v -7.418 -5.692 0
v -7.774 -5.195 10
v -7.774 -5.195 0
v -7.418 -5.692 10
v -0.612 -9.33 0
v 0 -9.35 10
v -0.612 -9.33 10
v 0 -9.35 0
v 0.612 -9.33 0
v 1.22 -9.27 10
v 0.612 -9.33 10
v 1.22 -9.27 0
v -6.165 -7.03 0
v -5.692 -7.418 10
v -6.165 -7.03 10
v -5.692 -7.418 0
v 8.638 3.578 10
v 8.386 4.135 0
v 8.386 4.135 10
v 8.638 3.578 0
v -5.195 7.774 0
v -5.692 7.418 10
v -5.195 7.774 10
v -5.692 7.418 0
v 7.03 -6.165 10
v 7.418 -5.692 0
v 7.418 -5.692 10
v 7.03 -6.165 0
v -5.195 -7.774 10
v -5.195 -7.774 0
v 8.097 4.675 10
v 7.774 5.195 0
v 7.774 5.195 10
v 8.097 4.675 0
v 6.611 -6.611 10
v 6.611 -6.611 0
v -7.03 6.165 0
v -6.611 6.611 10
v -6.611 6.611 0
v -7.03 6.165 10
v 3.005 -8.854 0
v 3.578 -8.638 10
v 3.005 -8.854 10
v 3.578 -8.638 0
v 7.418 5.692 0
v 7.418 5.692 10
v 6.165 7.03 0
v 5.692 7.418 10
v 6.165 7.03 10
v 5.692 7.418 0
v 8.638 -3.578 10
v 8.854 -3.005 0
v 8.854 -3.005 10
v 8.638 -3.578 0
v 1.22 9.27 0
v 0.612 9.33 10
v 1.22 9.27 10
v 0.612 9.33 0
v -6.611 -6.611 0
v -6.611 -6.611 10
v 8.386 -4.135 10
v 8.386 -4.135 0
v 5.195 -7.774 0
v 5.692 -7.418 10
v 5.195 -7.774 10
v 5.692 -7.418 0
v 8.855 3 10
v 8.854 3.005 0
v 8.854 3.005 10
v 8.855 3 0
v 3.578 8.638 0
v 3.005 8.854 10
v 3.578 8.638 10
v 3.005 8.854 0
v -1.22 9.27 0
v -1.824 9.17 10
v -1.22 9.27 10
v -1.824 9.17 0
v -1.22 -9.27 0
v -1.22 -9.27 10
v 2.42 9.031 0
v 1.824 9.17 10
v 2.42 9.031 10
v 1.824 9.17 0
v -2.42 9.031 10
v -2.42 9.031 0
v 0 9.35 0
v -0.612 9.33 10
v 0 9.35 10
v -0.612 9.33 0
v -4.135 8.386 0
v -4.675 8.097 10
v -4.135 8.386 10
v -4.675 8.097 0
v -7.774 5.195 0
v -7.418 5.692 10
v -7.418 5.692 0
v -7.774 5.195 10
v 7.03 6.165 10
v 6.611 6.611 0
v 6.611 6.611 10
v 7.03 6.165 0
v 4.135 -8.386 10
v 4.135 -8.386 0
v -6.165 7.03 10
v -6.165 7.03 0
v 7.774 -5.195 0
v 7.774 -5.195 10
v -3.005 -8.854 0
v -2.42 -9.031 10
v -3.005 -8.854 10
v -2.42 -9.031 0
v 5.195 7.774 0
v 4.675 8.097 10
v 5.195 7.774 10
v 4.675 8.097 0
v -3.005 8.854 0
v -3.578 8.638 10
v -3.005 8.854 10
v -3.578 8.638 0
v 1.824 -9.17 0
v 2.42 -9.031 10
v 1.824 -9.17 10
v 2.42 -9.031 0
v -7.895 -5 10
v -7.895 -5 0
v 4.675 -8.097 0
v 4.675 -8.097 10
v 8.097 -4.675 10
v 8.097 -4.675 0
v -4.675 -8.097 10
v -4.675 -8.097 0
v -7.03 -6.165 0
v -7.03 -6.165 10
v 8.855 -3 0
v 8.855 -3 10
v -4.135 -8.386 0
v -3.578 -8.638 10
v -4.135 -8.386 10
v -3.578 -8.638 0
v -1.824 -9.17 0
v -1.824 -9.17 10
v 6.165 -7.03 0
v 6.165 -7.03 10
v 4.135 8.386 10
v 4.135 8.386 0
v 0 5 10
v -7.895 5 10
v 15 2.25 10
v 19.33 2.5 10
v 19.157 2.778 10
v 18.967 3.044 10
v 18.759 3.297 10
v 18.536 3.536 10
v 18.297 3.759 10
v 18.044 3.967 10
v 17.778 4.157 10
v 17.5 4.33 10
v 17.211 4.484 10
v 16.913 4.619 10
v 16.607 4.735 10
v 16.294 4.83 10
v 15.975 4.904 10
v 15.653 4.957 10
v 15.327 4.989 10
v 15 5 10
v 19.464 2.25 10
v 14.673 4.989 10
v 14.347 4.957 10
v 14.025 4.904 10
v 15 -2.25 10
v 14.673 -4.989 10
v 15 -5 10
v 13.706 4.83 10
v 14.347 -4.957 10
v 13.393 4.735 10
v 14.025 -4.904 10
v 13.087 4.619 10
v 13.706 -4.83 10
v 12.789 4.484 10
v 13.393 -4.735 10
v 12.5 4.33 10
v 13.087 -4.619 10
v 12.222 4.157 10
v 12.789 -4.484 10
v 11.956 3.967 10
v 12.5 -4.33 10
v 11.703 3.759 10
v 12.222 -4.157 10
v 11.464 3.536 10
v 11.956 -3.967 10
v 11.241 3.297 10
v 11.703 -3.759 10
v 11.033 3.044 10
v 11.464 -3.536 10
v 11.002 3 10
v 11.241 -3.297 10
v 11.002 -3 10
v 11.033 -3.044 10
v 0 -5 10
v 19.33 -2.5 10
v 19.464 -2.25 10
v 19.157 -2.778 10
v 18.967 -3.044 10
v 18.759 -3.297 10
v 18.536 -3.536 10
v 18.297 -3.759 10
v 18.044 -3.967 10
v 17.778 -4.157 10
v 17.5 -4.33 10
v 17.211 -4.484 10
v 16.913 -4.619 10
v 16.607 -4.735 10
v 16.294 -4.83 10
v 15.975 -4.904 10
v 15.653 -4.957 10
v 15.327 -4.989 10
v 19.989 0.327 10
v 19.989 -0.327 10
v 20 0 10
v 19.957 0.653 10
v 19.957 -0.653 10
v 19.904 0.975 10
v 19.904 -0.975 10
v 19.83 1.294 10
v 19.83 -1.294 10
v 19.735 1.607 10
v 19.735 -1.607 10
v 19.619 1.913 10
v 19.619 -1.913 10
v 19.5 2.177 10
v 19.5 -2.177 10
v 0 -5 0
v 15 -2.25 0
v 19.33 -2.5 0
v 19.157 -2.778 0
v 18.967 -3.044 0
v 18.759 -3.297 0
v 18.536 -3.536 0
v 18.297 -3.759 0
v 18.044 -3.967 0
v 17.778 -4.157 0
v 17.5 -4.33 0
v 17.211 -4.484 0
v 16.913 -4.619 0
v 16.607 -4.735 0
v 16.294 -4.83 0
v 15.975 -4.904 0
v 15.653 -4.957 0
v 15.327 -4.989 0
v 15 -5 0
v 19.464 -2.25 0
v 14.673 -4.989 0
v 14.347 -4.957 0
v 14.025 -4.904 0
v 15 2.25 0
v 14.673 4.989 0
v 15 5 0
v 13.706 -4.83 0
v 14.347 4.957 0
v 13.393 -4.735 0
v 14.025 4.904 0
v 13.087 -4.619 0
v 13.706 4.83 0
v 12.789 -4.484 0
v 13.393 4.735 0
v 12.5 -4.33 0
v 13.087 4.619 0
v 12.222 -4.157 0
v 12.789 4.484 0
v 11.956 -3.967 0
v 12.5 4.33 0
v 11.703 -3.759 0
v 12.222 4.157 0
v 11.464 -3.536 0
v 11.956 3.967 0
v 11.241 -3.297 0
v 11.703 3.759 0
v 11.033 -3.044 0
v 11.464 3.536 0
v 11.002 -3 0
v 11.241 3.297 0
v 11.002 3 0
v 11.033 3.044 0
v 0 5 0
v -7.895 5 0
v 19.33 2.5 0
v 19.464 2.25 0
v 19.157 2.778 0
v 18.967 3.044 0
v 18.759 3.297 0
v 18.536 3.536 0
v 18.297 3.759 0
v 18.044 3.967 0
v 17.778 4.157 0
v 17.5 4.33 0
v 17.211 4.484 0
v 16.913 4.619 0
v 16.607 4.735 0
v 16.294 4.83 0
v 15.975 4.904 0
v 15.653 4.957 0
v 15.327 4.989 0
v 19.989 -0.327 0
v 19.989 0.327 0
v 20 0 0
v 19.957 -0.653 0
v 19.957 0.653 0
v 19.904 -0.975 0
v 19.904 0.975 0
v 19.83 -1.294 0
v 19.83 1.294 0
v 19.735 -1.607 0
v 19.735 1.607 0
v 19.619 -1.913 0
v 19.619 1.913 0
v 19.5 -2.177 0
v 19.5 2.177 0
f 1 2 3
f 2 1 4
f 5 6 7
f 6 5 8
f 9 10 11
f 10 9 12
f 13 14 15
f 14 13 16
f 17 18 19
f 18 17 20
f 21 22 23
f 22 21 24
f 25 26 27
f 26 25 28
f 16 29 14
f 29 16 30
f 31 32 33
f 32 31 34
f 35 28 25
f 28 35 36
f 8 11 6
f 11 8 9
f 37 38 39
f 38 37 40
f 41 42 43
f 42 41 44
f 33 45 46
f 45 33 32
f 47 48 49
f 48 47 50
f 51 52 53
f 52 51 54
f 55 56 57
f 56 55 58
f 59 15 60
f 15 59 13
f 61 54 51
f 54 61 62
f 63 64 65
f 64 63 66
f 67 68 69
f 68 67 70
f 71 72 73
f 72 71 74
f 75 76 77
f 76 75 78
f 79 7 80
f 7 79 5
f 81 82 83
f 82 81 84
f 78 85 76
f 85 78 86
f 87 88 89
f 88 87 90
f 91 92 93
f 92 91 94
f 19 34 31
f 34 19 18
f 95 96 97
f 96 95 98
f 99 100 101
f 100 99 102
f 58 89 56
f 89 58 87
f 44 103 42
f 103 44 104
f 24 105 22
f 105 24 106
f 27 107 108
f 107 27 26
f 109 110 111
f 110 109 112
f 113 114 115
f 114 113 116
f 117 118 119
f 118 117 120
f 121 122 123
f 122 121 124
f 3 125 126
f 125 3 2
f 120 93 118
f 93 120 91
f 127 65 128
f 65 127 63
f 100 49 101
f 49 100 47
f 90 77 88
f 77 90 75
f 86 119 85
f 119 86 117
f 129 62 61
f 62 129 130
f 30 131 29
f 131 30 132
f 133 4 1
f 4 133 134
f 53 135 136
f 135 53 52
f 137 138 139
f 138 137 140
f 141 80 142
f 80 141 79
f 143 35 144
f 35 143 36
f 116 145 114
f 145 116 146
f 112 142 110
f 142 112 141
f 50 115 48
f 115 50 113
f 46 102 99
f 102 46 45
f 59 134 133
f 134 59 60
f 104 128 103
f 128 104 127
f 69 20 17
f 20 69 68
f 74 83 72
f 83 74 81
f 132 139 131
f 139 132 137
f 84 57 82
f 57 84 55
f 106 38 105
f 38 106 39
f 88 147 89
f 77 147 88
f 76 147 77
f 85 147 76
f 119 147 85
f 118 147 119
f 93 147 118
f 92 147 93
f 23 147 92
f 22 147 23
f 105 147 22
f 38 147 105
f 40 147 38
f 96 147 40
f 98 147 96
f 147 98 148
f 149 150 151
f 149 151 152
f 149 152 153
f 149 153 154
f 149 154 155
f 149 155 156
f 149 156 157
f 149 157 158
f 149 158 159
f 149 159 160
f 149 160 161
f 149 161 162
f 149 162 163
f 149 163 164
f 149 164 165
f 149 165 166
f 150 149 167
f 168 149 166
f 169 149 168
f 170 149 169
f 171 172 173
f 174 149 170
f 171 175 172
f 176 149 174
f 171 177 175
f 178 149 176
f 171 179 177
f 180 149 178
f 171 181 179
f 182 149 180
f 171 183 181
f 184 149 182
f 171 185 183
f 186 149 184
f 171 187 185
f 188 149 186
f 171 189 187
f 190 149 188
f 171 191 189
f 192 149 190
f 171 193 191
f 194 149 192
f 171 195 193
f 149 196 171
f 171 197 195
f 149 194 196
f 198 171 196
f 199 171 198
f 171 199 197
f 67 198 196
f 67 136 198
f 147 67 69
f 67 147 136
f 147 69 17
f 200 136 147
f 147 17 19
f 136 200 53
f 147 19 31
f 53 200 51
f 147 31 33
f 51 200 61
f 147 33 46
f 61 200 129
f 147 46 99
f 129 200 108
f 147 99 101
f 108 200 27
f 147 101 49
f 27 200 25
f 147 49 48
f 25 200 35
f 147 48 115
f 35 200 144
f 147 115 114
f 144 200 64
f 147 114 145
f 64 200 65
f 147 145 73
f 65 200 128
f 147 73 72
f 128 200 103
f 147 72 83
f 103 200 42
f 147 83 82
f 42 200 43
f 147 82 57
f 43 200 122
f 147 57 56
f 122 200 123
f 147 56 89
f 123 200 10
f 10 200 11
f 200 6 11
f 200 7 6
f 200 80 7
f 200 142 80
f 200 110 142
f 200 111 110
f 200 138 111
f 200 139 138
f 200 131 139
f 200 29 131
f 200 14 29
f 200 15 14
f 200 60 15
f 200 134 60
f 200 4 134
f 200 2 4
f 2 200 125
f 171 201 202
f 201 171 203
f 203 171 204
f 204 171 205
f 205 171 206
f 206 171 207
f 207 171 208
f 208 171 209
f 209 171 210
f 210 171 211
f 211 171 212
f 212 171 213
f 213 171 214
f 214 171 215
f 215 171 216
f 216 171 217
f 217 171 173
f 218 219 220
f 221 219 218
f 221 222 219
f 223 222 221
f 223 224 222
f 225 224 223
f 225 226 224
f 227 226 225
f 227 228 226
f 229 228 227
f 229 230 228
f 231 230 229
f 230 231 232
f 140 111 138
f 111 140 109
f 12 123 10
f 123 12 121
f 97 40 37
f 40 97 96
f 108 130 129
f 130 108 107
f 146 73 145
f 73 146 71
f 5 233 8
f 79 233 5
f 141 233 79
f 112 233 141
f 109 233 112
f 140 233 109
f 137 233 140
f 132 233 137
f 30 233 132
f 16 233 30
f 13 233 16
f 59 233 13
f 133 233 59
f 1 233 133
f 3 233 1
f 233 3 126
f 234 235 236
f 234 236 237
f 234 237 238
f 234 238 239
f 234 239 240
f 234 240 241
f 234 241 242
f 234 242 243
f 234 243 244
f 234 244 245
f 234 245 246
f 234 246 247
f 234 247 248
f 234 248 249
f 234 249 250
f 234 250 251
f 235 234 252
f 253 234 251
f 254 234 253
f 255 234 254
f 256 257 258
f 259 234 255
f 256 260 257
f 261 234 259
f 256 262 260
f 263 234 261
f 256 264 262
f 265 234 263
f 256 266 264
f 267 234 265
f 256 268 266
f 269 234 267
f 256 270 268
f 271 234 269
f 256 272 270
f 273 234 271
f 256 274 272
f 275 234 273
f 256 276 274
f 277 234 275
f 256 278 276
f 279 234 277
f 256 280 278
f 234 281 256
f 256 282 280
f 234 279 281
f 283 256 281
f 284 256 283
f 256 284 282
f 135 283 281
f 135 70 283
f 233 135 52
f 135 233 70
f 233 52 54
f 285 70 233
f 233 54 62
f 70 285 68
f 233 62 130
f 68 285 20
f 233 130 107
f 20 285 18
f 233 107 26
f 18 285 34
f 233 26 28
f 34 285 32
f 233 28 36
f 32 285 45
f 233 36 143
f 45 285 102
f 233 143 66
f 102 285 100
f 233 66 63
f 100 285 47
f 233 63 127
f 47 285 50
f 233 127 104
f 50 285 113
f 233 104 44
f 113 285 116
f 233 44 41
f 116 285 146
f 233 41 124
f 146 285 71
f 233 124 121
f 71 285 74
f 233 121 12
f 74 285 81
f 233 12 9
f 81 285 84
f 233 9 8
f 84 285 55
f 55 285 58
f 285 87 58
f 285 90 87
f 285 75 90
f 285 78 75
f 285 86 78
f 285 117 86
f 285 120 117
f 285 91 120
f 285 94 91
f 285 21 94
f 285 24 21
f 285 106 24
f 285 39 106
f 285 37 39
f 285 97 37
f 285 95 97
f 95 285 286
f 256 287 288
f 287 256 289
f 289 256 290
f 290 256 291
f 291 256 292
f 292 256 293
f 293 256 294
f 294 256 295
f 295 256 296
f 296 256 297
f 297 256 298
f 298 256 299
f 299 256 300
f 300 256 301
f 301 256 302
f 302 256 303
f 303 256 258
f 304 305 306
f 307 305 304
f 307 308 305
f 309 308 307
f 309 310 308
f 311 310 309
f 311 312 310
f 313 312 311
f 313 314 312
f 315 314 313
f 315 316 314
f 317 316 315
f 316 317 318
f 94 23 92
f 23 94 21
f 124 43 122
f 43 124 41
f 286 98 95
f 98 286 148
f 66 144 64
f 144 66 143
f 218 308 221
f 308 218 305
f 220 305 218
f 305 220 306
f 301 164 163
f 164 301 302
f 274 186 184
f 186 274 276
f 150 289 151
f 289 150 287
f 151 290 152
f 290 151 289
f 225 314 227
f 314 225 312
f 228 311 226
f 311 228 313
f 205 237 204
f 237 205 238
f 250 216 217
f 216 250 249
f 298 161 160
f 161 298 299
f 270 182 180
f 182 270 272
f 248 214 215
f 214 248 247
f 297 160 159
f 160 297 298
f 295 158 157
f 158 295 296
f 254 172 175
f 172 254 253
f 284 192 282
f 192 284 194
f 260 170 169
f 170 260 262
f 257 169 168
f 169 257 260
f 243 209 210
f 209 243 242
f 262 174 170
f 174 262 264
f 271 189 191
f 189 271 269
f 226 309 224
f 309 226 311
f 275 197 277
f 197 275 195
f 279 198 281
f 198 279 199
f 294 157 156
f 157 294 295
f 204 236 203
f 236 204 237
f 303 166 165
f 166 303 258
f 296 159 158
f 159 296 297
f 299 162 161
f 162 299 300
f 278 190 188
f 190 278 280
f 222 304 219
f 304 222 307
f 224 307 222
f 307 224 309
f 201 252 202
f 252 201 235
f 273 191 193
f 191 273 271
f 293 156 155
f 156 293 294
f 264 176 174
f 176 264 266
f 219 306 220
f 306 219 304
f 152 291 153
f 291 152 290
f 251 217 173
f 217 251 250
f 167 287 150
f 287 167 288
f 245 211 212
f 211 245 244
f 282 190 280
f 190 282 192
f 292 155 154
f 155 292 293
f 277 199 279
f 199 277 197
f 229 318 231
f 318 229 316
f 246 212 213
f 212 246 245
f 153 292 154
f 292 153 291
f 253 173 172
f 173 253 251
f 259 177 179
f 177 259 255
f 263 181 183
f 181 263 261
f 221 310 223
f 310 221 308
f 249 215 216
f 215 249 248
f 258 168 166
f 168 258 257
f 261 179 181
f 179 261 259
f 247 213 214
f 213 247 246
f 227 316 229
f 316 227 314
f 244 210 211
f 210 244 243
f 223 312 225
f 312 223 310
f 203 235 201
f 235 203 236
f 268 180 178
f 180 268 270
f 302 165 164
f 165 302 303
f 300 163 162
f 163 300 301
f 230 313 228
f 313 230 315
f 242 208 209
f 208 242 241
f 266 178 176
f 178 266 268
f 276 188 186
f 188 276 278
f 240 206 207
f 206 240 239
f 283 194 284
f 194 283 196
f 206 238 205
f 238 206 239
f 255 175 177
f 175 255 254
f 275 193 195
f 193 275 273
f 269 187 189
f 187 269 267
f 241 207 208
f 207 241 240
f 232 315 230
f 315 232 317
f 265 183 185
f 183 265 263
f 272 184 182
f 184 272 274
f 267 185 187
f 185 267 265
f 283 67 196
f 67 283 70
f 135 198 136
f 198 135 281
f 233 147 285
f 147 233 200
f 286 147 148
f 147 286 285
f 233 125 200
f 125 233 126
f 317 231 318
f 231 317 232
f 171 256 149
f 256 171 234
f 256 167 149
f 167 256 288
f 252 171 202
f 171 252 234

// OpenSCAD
// Snap-on tubing clip for 12.7 mm lab stand rod
// Print orientation: flat on bed, extrusion along +Z

$fn = 96;

// ---- Dimensions (mm) ----
rod_d      = 12.7;   // rod diameter
ring_w     = 3;      // rod ring wall
rod_od     = rod_d + 2*ring_w; // rod ring outer diameter (18.7)
opening_w  = 10;     // rod ring opening width
rod_x      = 0;      // rod ring centre X
rod_y      = 0;      // rod ring centre Y

tub_d      = 6;      // tubing inner diameter
tub_w      = 2;      // tubing wall
tub_od     = tub_d + 2*tub_w; // tubing outer diameter (10)
tub_open   = 4.5;    // tubing opening width
tub_x      = 15;     // tubing ring centre X
tub_y      = 0;      // tubing ring centre Y

bridge_x1  = 8;      // bridge start X
bridge_x2  = 12;     // bridge end X
bridge_w   = 6;      // bridge width (Y)

h          = 10;     // extrusion height
eps        = 0.5;    // cut overshoot

// ---- Model ----
difference() {
    union() {
        // Rod ring
        cylinder(d = rod_od, h = h);
        // Tubing ring
        translate([tub_x, tub_y, 0])
            cylinder(d = tub_od, h = h);
        // Bridge
        translate([bridge_x1, -bridge_w/2, 0])
            cube([bridge_x2 - bridge_x1, bridge_w, h]);
    }
    // Rod opening
    translate([rod_x - opening_w, -opening_w/2, -eps])
        cube([opening_w, opening_w, h + 2*eps]);
    // Tubing opening
    translate([tub_x, -tub_open/2, -eps])
        cube([tub_open, tub_open, h + 2*eps]);
}
